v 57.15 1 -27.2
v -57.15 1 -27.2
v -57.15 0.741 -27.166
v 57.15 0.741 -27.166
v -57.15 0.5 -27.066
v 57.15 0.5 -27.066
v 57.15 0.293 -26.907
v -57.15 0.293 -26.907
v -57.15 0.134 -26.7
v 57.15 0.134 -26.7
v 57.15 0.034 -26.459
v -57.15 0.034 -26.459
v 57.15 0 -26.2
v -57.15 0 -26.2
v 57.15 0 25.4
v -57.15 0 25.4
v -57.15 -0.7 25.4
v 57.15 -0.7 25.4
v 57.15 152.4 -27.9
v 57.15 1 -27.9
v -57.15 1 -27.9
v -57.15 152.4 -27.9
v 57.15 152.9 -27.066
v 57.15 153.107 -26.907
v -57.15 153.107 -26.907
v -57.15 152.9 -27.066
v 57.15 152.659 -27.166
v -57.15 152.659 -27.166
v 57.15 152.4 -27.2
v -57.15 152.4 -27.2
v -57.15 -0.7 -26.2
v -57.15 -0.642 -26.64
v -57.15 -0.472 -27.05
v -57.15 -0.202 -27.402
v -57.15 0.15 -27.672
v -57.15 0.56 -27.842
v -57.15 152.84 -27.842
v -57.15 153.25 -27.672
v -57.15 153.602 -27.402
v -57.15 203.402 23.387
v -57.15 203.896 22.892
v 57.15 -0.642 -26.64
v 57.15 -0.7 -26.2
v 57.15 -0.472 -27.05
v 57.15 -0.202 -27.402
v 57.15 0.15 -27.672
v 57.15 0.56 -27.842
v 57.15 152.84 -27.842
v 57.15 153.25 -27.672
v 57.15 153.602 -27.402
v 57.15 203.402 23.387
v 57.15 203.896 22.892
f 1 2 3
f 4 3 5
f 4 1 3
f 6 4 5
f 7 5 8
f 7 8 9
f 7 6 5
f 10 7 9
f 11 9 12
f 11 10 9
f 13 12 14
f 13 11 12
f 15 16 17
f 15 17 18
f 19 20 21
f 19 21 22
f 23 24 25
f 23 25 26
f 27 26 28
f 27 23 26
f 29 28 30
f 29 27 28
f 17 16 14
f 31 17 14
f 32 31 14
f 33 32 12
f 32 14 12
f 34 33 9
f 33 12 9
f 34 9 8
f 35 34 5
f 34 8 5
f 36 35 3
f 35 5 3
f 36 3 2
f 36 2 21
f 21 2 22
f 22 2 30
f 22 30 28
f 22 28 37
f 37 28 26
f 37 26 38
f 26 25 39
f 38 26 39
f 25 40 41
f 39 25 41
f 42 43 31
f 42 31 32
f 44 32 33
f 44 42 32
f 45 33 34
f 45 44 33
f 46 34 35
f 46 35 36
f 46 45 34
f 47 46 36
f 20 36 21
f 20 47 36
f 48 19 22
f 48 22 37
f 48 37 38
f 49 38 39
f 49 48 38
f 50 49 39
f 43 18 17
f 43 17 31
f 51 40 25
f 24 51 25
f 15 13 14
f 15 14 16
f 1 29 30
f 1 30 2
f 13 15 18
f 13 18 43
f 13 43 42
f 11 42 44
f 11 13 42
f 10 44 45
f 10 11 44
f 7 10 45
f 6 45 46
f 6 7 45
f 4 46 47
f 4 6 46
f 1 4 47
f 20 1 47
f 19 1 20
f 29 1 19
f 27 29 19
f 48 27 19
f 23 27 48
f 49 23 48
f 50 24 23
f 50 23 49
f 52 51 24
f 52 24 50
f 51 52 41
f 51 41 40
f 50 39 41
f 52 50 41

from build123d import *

# Parameters (mm, degrees)
SKETCH1_W          = 114.3
SKETCH1_H          = 50.8
BASE_FLANGE1_DEPTH = 0.7
EDGE_FLANGE1_DEPTH = 114.3
EDGE_FLANGE2_DEPTH = 114.3


# Sheet-metal steps are written as plain solids
with BuildPart() as part:
    # Sketch1 → Base-Flange1 (new body)
    with BuildSketch(Plane(origin=(0, 0, 0), x_dir=(1, 0, 0), z_dir=(0, 1, 0))):
        Rectangle(SKETCH1_W, SKETCH1_H)
    extrude(amount=-BASE_FLANGE1_DEPTH)

    # Edge-Flange1 section (across the edge) → Edge-Flange1 (add)
    with BuildSketch(Plane(origin=(57.15, 0, -27.2), x_dir=(0, 0, 1), z_dir=(-1, 0, 0))):
        with BuildLine():
            Line((-0.7, 1), (-0.7, 152.4))
            Line((-0.7, 152.4), (0, 152.4))
            Line((0, 152.4), (0, 1))
            ThreePointArc((0, 1), (0.292893219, 0.292893219), (1, 0))
            Line((1, 0), (1.8, 0))
            Line((1.8, 0), (1.8, -0.7))
            Line((1.8, -0.7), (1, -0.7))
            ThreePointArc((1, -0.7), (-0.202081528, -0.202081528), (-0.7, 1))
        make_face()
    extrude(amount=EDGE_FLANGE1_DEPTH)

    # Edge-Flange2 section (across the edge) → Edge-Flange2 (add)
    with BuildSketch(Plane(origin=(57.15, 152.814213562, -27.2), x_dir=(0, -0.7071067811865414, 0.7071067811865537), z_dir=(-1, 0, 0))):
        with BuildLine():
            Line((-0.7, 0.414213562), (-0.7, 71.541250506))
            Line((-0.7, 71.541250506), (0, 71.541250506))
            Line((0, 71.541250506), (0, 0.414213562))
            ThreePointArc((0, 0.414213562), (0.076120467, 0.03153013), (0.292893219, -0.292893219))
            Line((0.292893219, -0.292893219), (-0.202081528, -0.787867966))
            ThreePointArc((-0.202081528, -0.787867966), (-0.570595205, -0.236348273), (-0.7, 0.414213562))
        make_face()
    extrude(amount=EDGE_FLANGE2_DEPTH)


solid = part.part
